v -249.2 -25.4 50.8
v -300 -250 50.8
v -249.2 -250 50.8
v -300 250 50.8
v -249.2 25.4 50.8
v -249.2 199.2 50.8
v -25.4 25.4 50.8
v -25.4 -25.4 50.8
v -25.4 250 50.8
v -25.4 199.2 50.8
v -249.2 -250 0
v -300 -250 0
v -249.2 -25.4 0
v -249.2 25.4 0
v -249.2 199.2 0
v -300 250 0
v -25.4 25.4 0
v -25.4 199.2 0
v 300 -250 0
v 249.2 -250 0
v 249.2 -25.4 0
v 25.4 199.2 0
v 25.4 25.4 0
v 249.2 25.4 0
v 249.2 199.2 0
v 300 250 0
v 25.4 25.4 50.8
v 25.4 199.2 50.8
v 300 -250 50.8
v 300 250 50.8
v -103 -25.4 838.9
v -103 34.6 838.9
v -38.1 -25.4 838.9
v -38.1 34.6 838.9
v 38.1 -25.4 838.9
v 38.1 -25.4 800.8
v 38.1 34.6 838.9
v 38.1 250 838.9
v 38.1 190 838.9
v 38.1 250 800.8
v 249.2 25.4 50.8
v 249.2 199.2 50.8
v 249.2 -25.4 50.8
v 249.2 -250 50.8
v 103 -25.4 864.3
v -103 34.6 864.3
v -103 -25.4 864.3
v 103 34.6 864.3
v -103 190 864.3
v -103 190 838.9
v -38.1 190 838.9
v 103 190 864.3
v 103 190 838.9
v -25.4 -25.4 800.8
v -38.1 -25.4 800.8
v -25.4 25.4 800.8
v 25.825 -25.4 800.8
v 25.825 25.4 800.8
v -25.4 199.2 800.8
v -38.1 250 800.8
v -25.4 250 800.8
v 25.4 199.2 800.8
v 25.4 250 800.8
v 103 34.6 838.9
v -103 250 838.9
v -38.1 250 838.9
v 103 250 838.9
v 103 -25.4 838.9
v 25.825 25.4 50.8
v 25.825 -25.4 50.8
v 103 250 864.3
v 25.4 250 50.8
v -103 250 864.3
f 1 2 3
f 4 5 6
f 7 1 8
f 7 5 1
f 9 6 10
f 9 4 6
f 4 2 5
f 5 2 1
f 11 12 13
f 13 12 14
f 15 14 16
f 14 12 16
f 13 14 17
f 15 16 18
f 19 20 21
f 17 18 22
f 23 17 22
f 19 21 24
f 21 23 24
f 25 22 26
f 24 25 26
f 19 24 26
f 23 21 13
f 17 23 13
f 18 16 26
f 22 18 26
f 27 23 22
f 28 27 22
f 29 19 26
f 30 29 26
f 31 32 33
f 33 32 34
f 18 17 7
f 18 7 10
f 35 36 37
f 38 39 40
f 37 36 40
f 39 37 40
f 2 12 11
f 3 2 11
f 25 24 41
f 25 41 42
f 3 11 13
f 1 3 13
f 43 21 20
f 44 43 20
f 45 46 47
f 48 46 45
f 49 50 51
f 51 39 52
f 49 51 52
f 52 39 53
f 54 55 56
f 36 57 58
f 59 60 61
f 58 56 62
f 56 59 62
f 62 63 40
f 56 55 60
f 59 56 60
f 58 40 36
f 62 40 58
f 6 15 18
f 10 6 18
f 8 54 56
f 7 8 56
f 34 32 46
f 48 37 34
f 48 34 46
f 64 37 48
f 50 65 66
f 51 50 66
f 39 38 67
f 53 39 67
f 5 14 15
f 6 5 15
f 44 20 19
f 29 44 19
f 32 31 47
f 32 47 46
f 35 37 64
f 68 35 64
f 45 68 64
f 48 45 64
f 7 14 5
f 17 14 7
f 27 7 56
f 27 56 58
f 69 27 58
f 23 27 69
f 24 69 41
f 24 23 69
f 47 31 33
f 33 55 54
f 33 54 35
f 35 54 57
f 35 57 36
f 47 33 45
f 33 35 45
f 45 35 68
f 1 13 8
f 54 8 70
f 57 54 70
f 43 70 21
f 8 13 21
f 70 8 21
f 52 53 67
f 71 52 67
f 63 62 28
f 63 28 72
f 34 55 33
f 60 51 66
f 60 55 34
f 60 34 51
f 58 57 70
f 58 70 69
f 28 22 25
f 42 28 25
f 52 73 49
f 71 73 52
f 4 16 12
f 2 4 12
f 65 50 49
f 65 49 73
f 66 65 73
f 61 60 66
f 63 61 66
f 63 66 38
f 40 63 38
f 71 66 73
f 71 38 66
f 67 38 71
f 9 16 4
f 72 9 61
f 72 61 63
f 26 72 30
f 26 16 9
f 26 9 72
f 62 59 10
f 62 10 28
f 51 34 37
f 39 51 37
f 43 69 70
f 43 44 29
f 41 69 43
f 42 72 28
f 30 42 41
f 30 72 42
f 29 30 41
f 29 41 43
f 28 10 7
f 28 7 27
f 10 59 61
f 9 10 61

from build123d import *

# Parameters (mm, degrees)
F0_W     = 223.8
F0_H     = 173.8
F1_DEPTH = 50.8
F2_W     = 51.225417
F2_H     = 50.8
F2_W_2   = 50.8
F3_DEPTH = 750
F5_W     = 76.2
F5_H     = 275.4
F6_DEPTH = 38.1
F8_W     = 206
F8_H     = 60
F9_DEPTH = 25.4


with BuildPart() as f1:
    # F0 (on Top) → F1 (new body)
    with BuildSketch(Plane.XY):
        Polygon((0, 250), (-300, 250), (-300, -250), (-249.2, -250), (-249.2, -25.4), (0, -25.4), (249.2, -25.4), (249.2, -250), (300, -250), (300, 250), align=None)
        with Locations((-137.3, 112.3)):
            Rectangle(F0_W, F0_H, mode=Mode.SUBTRACT)
        with Locations((137.3, 112.3)):
            Rectangle(F0_W, F0_H, mode=Mode.SUBTRACT)
    extrude(amount=F1_DEPTH)

    # F2 (on face) → F3 (join)
    with BuildSketch(Plane.XY.offset(50.8)):
        with Locations((0.212708, 0)):
            Rectangle(F2_W, F2_H)
        with Locations((0, 224.6)):
            Rectangle(F2_W_2, F2_H)
    extrude(amount=F3_DEPTH)

    # F5 (on offset) → F6 (join)
    with BuildSketch(Plane.XY.offset(800.8)):
        with Locations((0, 112.3)):
            Rectangle(F5_W, F5_H)
    extrude(amount=F6_DEPTH)

    # F8 (on offset) → F9 (join)
    with BuildSketch(Plane.XY.offset(838.9)):
        with Locations((0, 4.6)):
            Rectangle(F8_W, F8_H)
        with Locations((0, 220)):
            Rectangle(F8_W, F8_H)
    extrude(amount=F9_DEPTH)


solid = f1.part
